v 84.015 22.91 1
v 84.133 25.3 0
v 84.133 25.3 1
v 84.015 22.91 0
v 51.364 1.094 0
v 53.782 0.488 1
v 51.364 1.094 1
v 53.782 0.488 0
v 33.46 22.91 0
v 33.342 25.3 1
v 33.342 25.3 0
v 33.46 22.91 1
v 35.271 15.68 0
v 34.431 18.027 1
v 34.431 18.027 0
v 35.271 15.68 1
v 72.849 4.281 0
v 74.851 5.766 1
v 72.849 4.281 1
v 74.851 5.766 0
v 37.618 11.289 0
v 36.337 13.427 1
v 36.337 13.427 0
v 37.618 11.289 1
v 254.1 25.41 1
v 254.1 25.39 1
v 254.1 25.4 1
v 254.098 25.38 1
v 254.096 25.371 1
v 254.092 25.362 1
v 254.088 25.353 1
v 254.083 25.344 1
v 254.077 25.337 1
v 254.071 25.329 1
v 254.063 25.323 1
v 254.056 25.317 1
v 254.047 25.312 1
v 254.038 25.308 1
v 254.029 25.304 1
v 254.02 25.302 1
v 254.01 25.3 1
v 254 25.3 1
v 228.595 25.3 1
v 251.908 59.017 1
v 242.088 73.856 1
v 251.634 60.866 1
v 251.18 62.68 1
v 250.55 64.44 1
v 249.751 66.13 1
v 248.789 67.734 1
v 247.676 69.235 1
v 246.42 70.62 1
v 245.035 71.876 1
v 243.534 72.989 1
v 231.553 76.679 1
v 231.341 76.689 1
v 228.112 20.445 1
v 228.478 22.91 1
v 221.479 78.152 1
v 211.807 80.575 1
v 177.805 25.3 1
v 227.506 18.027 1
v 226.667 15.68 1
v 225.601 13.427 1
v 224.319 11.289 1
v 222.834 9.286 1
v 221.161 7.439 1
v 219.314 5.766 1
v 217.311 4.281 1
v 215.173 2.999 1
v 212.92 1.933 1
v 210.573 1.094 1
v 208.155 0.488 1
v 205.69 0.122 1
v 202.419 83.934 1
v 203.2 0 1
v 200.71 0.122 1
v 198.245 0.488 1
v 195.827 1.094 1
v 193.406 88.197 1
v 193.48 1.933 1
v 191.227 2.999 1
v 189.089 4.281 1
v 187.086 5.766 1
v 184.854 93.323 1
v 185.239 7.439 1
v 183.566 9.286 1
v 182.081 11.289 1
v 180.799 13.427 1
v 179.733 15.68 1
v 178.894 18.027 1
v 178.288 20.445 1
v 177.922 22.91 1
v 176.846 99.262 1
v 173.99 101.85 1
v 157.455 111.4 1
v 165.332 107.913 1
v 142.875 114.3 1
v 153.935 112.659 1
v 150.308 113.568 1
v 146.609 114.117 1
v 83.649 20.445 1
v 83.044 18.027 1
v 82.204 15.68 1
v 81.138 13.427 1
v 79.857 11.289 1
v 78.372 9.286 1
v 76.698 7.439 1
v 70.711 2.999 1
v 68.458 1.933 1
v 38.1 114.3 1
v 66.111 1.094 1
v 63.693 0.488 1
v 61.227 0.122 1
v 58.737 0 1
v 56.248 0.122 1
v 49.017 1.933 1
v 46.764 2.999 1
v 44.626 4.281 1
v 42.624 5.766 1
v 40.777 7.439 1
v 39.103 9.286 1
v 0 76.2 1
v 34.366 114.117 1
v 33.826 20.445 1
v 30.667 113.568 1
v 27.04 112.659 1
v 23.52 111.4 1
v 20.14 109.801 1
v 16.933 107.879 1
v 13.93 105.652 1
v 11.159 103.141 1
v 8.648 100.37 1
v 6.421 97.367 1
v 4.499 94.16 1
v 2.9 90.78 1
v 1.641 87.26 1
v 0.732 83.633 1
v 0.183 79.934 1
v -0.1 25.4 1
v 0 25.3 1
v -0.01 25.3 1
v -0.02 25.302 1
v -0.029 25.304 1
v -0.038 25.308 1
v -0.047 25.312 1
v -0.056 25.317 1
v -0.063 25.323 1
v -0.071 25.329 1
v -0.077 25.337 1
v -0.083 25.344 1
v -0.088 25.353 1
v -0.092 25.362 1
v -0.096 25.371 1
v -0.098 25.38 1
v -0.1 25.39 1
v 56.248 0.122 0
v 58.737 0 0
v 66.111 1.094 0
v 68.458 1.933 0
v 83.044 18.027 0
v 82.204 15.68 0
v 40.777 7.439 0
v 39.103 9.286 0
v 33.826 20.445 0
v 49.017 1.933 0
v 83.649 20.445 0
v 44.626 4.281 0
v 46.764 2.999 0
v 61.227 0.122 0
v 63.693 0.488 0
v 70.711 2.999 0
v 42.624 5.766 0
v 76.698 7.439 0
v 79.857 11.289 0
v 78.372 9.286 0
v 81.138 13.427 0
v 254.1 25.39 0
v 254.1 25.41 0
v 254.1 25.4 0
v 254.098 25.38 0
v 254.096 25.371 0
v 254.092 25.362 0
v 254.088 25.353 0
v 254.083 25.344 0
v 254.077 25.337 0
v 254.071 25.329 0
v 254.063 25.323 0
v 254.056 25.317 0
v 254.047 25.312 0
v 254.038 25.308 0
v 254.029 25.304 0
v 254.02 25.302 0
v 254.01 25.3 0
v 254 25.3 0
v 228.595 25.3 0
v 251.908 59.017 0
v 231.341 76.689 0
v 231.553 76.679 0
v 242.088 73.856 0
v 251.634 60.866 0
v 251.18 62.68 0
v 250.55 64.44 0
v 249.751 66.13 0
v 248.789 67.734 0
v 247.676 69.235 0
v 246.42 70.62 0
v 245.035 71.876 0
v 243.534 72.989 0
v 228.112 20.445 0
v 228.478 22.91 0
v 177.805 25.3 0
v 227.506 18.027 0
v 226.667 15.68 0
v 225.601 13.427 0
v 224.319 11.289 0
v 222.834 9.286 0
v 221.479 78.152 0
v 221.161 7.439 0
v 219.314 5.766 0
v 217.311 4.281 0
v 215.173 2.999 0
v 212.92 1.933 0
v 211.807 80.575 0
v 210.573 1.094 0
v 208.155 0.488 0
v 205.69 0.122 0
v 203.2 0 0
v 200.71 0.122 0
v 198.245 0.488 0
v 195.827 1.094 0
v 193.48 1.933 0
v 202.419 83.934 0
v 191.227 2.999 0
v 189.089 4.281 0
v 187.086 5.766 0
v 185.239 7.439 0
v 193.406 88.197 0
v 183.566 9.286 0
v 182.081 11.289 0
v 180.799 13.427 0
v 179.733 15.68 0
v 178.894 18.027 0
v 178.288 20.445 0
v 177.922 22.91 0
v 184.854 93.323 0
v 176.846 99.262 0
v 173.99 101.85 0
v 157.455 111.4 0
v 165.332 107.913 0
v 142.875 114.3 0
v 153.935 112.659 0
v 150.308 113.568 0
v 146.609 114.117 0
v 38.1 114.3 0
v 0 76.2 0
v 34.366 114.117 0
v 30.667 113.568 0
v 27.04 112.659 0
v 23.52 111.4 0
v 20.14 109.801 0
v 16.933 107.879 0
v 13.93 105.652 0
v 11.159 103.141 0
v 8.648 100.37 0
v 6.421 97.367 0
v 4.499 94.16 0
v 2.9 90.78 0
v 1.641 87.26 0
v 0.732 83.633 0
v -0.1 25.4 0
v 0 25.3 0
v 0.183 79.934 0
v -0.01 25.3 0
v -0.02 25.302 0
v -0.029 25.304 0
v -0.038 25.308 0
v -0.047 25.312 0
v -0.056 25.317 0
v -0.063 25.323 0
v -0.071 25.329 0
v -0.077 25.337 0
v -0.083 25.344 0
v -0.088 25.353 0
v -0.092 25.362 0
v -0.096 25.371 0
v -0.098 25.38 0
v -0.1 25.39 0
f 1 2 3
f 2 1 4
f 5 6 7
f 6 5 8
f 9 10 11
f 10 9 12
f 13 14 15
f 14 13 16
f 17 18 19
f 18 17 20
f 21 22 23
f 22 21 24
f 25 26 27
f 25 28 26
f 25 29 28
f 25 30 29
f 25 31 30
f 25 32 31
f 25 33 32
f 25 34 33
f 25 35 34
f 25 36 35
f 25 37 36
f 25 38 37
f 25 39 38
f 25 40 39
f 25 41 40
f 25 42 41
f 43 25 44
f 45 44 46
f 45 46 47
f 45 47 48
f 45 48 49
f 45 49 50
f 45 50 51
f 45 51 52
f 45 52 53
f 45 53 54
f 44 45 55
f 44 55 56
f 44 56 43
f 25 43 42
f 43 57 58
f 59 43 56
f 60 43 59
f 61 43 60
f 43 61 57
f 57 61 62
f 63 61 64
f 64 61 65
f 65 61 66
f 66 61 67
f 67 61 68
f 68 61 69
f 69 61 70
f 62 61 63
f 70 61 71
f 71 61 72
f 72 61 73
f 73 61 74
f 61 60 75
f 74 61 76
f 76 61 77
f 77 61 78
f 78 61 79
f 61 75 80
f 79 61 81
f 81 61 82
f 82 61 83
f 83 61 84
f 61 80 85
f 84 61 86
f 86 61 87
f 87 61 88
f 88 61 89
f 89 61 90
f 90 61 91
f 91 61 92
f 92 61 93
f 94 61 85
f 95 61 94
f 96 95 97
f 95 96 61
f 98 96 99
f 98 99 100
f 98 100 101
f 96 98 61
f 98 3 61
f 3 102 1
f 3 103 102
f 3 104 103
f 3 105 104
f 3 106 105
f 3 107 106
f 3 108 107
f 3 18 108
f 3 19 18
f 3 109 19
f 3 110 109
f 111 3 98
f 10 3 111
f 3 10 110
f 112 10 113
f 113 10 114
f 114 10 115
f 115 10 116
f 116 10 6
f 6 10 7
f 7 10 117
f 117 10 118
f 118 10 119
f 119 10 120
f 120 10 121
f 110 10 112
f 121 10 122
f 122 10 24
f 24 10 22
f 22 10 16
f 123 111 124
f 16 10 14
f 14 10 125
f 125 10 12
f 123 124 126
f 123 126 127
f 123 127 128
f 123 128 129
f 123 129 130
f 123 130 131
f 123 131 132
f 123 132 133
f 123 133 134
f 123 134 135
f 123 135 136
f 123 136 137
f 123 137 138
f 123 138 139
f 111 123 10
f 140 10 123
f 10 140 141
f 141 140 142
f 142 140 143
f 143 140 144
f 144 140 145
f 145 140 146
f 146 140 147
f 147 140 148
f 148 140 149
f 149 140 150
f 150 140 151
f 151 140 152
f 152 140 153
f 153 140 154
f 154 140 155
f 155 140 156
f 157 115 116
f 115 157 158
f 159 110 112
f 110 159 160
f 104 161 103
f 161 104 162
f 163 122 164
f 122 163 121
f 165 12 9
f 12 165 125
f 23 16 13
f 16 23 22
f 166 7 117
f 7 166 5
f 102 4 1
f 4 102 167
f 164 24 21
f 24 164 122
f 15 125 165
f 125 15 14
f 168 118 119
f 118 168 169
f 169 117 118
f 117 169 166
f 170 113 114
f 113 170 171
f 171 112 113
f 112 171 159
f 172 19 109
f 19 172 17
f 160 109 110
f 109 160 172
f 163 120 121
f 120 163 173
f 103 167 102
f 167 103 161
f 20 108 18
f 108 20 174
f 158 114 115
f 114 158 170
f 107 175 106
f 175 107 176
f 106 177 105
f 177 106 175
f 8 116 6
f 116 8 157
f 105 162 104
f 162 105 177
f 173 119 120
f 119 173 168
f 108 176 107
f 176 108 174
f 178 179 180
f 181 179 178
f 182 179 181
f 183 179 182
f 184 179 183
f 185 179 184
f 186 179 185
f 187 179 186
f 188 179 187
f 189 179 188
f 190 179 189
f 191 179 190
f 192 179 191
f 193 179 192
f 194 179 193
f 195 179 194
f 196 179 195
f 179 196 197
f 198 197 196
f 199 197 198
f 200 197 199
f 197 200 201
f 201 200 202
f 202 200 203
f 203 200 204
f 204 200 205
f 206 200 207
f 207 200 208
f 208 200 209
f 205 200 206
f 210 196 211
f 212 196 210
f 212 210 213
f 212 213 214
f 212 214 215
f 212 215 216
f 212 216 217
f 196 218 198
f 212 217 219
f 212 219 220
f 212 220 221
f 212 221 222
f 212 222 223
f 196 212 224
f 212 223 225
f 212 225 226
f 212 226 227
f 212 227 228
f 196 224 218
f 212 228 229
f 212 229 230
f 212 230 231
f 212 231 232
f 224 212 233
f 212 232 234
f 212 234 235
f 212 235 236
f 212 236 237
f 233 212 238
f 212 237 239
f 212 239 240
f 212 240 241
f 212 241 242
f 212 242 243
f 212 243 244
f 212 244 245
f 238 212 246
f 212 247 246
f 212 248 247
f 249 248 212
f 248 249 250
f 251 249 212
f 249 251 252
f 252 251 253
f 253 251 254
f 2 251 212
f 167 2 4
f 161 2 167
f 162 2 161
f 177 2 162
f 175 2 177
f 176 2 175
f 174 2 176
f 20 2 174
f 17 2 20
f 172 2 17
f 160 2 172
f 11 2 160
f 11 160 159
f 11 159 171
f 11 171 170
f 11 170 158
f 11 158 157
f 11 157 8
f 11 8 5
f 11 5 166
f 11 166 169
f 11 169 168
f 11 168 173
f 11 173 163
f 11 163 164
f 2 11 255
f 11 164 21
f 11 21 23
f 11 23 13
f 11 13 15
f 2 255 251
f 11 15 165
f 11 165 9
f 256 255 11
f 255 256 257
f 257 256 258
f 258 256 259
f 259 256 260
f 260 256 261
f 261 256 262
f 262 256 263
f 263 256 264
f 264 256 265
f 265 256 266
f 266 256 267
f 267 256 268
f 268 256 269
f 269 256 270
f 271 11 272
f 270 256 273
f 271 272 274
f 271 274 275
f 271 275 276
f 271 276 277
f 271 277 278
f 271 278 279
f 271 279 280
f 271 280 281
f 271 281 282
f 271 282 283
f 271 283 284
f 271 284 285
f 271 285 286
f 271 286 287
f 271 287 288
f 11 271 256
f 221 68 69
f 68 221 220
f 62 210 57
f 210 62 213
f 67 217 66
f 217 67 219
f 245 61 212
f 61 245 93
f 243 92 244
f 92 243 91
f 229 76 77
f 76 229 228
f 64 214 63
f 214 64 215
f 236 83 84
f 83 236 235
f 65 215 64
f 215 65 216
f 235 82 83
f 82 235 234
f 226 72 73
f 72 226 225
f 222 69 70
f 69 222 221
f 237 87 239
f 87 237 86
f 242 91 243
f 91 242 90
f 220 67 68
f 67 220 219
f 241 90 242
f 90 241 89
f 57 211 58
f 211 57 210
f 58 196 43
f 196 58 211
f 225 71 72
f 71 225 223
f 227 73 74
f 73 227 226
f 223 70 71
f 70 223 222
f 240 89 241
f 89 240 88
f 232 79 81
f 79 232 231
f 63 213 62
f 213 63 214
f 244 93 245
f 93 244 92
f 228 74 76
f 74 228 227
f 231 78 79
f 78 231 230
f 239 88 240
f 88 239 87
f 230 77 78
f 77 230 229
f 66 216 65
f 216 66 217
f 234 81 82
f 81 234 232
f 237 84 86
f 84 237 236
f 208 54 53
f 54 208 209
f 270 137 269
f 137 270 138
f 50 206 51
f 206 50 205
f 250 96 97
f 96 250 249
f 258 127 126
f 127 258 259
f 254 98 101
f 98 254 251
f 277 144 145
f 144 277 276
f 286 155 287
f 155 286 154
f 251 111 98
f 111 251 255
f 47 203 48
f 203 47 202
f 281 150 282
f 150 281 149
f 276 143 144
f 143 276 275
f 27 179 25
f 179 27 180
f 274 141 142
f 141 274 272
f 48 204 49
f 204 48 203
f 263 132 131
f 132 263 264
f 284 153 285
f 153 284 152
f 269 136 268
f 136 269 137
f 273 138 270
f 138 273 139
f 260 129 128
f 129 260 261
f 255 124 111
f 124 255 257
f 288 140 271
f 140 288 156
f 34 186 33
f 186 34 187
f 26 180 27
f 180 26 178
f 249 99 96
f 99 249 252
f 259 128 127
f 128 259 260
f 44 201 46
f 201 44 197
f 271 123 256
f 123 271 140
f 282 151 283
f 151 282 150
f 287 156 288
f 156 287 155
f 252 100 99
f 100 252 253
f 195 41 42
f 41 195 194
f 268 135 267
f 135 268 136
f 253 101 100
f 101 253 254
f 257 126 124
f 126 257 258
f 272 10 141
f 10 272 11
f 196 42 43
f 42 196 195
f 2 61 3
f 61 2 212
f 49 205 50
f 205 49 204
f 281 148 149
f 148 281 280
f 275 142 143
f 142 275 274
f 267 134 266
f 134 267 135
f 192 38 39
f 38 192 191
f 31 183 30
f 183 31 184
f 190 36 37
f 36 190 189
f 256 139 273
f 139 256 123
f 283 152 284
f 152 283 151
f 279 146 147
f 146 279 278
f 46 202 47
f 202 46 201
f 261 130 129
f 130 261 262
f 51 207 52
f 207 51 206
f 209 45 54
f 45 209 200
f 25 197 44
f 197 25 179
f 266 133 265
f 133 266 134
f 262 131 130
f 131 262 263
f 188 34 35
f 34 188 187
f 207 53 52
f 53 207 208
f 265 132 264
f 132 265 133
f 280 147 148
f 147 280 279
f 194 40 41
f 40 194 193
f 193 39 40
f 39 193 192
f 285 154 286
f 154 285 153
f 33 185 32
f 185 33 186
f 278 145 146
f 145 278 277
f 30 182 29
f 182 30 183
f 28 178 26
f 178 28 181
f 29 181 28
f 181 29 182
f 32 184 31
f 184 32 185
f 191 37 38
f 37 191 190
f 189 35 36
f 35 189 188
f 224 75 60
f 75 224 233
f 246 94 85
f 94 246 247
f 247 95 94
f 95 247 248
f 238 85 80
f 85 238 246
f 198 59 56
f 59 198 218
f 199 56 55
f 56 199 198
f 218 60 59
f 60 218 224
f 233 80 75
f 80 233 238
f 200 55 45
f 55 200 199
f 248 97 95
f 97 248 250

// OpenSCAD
// test

$fn=64;

function inch(length) = 25.4 * length;

$wheel_r = inch(1);
$hood_r = inch(.75);
$hood_y = inch(2.25);

$roof_x = inch(5.625);
$roof_y = inch(3);
$roof_r = inch(1.5);

$rear_roof_r = inch(1.5);
$rear_roof_x = inch(1.5);
$rear_roof_y = inch(3);

$wheel_rear_x = inch(2.3125);
$wheel_front_x = inch(8);

$front_bump_x = inch(10);


module positive_body() {
    union() {
        translate([$wheel_rear_x,$wheel_r,0]) {
            cylinder(r=$wheel_r, h=1);
        }
        
        translate([$wheel_front_x,$wheel_r,0]) {
            cylinder(r=$wheel_r, h=1);
        }
        
        hull() {
            translate([0,$wheel_r,0]) {
                cylinder(r=0.1, h=1);
            }
            translate([$front_bump_x,$wheel_r,0]) {
                cylinder(r=0.1, h=1);
            }
            translate([$front_bump_x - $hood_r - 2,$hood_y,0]) {
                cylinder(r=$hood_r, h=1);
            }
        
            
            translate([$roof_x, $roof_y,0]) {
                cylinder(r=$roof_r, h=1);
            }
            translate([$rear_roof_x,$rear_roof_y,0]) {
                cylinder(r=$rear_roof_r, h=1);
            }  

        
        }
    }
}

module final_body() {
    difference() {
        positive_body();
        translate([inch(9.5),inch(7),0]) {
            cylinder(r=inch(4), h=5);
        }
        translate([inch(9),inch(3.05),0]) {
            rotate([0,0,-15]) {
                cube([inch(1),inch(1),5]);
            }
        }
        translate([inch(6.15),inch(4.5),0]) {
            rotate([0,0,-35]) {
                cube([inch(1),inch(1),5]);
            }
        }            
    }
}


$2d = 0;
if ($2d) {
    projection(cut=true) {
       translate([0,0,0]) rotate([0,0,0]) {
          final_body();
       }
    }
} else {
   translate([0,0,0]) rotate([0,0,0]) {
      final_body();
   }
}
